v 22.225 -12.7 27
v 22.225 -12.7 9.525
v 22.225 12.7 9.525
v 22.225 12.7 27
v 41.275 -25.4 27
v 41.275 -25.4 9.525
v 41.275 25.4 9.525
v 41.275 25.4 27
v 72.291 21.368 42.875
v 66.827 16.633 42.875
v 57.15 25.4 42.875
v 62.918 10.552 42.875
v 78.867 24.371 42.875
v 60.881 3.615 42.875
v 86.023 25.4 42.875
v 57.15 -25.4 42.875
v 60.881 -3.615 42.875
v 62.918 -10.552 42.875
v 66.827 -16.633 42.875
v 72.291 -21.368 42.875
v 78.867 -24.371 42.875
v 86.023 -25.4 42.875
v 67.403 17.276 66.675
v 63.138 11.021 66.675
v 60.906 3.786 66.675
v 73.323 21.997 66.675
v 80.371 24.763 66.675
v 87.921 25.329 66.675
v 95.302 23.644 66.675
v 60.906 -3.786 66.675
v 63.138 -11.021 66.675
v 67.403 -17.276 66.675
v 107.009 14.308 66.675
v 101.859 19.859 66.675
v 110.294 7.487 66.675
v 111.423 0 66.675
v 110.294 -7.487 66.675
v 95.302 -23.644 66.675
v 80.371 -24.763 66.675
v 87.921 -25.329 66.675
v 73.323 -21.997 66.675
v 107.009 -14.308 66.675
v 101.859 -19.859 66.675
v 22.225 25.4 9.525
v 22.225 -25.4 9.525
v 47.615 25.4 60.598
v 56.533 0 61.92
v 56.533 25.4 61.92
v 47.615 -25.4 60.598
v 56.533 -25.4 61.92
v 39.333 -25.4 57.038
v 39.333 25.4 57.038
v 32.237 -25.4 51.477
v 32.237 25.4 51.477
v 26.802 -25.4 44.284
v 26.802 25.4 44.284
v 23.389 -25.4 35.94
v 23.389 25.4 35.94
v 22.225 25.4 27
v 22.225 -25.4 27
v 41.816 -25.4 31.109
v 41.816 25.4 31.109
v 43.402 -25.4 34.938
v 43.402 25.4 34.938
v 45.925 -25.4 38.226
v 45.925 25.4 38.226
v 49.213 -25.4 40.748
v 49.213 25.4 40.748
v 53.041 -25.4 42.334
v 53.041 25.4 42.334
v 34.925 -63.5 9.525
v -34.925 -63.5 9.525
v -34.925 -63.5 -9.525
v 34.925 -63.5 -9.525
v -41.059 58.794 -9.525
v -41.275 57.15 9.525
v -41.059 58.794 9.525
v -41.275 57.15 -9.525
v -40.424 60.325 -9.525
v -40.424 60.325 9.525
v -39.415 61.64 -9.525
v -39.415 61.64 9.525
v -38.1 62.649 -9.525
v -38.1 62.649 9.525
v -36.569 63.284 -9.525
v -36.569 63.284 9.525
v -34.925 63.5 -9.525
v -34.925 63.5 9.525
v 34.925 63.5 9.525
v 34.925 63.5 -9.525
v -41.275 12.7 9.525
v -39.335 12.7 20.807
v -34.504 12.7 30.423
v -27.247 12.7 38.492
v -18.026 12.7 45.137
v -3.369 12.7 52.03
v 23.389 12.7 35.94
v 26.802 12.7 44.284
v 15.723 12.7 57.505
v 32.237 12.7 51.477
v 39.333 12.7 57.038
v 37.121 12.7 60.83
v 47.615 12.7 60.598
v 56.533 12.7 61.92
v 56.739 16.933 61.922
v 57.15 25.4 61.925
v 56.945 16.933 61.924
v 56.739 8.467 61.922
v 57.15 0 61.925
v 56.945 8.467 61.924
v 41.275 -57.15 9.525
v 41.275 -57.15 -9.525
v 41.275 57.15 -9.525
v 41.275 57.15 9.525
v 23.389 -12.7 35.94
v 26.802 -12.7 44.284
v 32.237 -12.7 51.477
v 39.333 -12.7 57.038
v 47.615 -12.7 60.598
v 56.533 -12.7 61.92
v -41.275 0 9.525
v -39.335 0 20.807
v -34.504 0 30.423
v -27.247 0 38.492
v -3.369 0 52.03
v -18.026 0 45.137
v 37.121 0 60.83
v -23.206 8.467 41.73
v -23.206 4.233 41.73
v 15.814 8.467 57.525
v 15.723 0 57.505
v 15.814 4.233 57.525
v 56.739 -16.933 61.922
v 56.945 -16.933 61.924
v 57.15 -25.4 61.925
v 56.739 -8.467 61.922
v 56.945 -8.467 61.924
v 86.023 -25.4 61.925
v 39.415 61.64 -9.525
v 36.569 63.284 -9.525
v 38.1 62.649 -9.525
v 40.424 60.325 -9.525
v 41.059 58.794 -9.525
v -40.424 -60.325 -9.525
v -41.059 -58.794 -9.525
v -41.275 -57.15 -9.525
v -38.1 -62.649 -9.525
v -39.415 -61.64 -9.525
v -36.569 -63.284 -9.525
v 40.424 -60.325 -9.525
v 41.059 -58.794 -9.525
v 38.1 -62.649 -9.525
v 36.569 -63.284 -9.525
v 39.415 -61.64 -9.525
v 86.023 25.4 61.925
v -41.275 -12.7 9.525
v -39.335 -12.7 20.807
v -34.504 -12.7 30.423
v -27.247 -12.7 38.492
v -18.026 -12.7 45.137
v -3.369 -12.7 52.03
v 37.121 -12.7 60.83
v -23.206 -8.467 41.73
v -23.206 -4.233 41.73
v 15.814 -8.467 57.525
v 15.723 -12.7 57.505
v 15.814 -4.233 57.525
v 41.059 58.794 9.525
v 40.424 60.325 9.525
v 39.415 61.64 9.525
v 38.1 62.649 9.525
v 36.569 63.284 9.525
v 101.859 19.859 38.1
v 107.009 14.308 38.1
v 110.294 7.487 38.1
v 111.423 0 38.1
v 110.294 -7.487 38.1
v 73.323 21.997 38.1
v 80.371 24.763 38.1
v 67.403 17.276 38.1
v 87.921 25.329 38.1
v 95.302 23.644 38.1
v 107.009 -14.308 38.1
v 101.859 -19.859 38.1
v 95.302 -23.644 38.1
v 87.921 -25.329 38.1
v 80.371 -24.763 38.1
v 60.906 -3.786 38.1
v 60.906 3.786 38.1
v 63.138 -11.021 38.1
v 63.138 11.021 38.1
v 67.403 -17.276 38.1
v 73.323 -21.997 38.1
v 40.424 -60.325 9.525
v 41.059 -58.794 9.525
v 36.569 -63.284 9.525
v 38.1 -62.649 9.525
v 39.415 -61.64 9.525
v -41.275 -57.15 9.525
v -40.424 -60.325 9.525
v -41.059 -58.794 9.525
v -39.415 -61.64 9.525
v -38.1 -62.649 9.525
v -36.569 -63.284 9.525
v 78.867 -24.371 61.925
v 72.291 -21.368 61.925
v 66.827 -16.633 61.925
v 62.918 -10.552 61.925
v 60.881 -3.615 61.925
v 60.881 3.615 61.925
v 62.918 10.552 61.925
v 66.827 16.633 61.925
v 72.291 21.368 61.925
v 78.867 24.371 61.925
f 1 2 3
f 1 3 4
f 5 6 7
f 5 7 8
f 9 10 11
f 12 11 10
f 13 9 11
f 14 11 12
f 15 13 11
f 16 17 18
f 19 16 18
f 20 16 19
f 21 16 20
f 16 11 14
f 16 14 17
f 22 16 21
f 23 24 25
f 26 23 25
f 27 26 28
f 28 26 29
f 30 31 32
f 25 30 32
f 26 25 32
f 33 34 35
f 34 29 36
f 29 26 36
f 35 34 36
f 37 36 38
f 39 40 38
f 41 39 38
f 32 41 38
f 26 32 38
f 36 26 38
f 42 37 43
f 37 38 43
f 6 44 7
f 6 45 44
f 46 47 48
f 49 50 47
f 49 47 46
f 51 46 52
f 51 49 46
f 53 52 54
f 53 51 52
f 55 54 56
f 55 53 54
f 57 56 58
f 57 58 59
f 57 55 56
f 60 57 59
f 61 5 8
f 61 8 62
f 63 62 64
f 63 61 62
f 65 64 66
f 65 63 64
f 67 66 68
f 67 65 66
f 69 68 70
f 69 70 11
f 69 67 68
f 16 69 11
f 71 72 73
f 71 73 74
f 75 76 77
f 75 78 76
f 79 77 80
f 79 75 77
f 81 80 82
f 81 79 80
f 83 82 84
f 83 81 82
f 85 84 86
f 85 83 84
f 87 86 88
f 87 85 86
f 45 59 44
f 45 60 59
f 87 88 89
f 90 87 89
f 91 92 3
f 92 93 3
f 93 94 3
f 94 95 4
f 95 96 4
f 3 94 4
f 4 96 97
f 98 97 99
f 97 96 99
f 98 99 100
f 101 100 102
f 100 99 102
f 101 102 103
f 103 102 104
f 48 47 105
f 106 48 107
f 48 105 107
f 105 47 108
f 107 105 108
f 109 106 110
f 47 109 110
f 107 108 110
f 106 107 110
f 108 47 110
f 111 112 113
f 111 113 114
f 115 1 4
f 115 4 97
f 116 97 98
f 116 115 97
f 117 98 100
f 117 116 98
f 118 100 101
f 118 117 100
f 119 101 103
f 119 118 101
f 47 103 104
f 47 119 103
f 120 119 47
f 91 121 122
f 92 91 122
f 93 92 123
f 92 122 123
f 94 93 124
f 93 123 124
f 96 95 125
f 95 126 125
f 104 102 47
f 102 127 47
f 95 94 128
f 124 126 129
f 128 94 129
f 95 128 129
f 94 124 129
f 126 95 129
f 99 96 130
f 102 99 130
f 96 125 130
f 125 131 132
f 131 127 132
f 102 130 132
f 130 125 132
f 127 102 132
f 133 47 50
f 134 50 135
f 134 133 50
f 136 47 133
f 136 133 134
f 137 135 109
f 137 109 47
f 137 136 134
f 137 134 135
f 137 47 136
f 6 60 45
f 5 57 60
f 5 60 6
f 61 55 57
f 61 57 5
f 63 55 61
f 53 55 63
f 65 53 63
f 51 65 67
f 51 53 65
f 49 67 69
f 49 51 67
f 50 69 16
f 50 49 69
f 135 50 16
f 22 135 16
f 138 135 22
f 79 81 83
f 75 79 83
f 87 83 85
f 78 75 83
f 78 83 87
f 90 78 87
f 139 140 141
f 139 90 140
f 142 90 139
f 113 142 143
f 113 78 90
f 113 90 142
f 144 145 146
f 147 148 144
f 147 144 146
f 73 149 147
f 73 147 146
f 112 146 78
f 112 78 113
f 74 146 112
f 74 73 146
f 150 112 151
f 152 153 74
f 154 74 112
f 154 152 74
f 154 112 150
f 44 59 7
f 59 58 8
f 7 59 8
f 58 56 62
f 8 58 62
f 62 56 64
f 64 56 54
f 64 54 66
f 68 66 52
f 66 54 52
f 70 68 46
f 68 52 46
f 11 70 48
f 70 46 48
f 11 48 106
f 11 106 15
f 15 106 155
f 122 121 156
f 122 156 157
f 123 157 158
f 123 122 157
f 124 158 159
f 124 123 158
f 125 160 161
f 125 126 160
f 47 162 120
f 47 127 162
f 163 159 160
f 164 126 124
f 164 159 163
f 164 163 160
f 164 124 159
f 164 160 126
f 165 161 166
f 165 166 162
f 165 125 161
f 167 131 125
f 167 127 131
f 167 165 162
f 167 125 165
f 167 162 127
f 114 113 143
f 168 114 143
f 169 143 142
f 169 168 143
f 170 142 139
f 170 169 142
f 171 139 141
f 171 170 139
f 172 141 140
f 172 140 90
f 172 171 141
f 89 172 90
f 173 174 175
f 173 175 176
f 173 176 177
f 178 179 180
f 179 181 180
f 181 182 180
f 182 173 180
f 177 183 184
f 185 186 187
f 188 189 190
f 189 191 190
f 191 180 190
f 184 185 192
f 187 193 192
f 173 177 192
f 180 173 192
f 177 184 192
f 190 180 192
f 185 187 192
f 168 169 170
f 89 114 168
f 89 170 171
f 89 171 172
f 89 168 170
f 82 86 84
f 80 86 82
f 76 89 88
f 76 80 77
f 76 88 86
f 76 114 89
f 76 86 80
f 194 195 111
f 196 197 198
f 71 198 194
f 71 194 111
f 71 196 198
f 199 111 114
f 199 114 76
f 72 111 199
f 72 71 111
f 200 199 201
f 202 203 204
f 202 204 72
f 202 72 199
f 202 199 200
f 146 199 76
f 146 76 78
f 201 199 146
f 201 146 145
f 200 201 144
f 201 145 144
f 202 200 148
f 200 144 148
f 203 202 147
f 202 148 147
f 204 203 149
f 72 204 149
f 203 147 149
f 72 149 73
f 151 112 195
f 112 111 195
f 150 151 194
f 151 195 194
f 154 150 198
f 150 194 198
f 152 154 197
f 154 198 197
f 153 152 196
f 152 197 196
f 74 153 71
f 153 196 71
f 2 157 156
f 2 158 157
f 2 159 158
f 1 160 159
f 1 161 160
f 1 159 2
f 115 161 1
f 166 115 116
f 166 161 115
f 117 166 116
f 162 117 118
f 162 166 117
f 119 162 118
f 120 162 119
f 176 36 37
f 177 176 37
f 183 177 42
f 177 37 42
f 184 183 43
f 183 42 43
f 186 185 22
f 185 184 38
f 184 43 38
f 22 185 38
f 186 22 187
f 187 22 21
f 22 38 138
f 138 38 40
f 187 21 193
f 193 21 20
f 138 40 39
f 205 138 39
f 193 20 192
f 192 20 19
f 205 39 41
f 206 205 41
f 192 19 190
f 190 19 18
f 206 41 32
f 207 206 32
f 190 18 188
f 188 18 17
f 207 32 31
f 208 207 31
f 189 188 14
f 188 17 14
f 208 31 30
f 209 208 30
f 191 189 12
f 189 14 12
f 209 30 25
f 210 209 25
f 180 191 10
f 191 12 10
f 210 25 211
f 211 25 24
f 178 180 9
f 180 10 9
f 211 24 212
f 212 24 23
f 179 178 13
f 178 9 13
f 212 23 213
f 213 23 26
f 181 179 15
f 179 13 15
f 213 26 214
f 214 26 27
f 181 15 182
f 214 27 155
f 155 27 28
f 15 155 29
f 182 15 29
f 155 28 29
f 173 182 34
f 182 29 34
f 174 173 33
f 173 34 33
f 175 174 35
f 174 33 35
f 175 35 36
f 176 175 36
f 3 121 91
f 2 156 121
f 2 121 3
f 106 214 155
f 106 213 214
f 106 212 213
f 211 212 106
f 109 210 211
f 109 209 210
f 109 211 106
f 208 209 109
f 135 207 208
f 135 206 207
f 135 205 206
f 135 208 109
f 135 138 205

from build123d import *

# Parameters (mm, degrees)
F1_DEPTH = 63.5
F0_W     = 25.4
F0_H     = 19.05
F2_DEPTH = 25.4
F3_DEPTH = 12.7
F5_R     = 6.35


with BuildPart() as f1:
    # F0 (on Front) → F1 (new body, symmetric)
    with BuildSketch(Plane.XZ):
        Polygon((41.275, -9.525), (41.275, 9.525), (22.225, 9.525), (-41.275, 9.525), (-41.275, -9.525), align=None)
    extrude(amount=F1_DEPTH, both=True)

    # F5
    f5_edges = [f1.edges().sort_by_distance(p)[0] for p in [
        (41.275, -63.5, 0),
        (-41.275, -63.5, 0),
        (41.275, 63.5, 0),
        (-41.275, 63.5, 0),
    ]]
    fillet(f5_edges, radius=F5_R)


with BuildPart() as f2:
    # F0 (on Front) → F2 (new body, symmetric)
    with BuildSketch(Plane.XZ):
        with BuildLine():
            Line((22.225, 9.525), (41.275, 9.525))
            Line((41.275, 9.525), (41.275, 27.0002))
            ThreePointArc((41.275, 27.0002), (45.92468, 38.22552), (57.15, 42.8752))
            Line((57.15, 42.8752), (60.62278, 42.8752))
            Line((60.62278, 42.8752), (60.62278, 61.9252))
            Line((60.62278, 61.9252), (57.15, 61.9252))
            add(Edge.make_bspline(
                [(56.533133, 61.919752), (56.73967, 61.921897), (56.945298, 61.923712), (57.15, 61.9252)],
                knots=[110.853217, 110.853217, 110.853217, 110.853217, 111.504536, 111.504536, 111.504536, 111.504536], degree=3))
            ThreePointArc((56.533133, 61.919752), (32.237155, 51.476837), (22.225, 27.0002))
            Line((22.225, 27.0002), (22.225, 9.525))
        make_face()
        with Locations((73.32278, 52.4002)):
            Rectangle(F0_W, F0_H)
    extrude(amount=F2_DEPTH, both=True)

    # F0 (on Front) → F4 (revolve)
    with BuildSketch(Plane.XZ):
        Polygon((86.02278, 61.9252), (86.02278, 42.8752), (86.02278, 38.1), (111.42278, 38.1), (111.42278, 66.675), (86.02278, 66.675), align=None)
    revolve(axis=Axis((86.02278, 0, 52.4002), (0, 0, -1)))


with BuildPart() as f3:
    # F0 (on Front) → F3 (new body, symmetric)
    with BuildSketch(Plane.XZ):
        with BuildLine():
            Line((-41.275, 9.525), (22.225, 9.525))
            Line((22.225, 9.525), (22.225, 27.0002))
            ThreePointArc((22.225, 27.0002), (32.237155, 51.476837), (56.533133, 61.919752))
            add(Edge.make_bspline(
                [(-41.275, 9.525), (-40.098705, 51.604141), (21.380937, 61.554604), (56.533133, 61.919752)],
                knots=[0, 0, 0, 0, 110.853217, 110.853217, 110.853217, 110.853217], degree=3))
        make_face()
    extrude(amount=F3_DEPTH, both=True)


solid = Compound([f1.part, f2.part, f3.part])
